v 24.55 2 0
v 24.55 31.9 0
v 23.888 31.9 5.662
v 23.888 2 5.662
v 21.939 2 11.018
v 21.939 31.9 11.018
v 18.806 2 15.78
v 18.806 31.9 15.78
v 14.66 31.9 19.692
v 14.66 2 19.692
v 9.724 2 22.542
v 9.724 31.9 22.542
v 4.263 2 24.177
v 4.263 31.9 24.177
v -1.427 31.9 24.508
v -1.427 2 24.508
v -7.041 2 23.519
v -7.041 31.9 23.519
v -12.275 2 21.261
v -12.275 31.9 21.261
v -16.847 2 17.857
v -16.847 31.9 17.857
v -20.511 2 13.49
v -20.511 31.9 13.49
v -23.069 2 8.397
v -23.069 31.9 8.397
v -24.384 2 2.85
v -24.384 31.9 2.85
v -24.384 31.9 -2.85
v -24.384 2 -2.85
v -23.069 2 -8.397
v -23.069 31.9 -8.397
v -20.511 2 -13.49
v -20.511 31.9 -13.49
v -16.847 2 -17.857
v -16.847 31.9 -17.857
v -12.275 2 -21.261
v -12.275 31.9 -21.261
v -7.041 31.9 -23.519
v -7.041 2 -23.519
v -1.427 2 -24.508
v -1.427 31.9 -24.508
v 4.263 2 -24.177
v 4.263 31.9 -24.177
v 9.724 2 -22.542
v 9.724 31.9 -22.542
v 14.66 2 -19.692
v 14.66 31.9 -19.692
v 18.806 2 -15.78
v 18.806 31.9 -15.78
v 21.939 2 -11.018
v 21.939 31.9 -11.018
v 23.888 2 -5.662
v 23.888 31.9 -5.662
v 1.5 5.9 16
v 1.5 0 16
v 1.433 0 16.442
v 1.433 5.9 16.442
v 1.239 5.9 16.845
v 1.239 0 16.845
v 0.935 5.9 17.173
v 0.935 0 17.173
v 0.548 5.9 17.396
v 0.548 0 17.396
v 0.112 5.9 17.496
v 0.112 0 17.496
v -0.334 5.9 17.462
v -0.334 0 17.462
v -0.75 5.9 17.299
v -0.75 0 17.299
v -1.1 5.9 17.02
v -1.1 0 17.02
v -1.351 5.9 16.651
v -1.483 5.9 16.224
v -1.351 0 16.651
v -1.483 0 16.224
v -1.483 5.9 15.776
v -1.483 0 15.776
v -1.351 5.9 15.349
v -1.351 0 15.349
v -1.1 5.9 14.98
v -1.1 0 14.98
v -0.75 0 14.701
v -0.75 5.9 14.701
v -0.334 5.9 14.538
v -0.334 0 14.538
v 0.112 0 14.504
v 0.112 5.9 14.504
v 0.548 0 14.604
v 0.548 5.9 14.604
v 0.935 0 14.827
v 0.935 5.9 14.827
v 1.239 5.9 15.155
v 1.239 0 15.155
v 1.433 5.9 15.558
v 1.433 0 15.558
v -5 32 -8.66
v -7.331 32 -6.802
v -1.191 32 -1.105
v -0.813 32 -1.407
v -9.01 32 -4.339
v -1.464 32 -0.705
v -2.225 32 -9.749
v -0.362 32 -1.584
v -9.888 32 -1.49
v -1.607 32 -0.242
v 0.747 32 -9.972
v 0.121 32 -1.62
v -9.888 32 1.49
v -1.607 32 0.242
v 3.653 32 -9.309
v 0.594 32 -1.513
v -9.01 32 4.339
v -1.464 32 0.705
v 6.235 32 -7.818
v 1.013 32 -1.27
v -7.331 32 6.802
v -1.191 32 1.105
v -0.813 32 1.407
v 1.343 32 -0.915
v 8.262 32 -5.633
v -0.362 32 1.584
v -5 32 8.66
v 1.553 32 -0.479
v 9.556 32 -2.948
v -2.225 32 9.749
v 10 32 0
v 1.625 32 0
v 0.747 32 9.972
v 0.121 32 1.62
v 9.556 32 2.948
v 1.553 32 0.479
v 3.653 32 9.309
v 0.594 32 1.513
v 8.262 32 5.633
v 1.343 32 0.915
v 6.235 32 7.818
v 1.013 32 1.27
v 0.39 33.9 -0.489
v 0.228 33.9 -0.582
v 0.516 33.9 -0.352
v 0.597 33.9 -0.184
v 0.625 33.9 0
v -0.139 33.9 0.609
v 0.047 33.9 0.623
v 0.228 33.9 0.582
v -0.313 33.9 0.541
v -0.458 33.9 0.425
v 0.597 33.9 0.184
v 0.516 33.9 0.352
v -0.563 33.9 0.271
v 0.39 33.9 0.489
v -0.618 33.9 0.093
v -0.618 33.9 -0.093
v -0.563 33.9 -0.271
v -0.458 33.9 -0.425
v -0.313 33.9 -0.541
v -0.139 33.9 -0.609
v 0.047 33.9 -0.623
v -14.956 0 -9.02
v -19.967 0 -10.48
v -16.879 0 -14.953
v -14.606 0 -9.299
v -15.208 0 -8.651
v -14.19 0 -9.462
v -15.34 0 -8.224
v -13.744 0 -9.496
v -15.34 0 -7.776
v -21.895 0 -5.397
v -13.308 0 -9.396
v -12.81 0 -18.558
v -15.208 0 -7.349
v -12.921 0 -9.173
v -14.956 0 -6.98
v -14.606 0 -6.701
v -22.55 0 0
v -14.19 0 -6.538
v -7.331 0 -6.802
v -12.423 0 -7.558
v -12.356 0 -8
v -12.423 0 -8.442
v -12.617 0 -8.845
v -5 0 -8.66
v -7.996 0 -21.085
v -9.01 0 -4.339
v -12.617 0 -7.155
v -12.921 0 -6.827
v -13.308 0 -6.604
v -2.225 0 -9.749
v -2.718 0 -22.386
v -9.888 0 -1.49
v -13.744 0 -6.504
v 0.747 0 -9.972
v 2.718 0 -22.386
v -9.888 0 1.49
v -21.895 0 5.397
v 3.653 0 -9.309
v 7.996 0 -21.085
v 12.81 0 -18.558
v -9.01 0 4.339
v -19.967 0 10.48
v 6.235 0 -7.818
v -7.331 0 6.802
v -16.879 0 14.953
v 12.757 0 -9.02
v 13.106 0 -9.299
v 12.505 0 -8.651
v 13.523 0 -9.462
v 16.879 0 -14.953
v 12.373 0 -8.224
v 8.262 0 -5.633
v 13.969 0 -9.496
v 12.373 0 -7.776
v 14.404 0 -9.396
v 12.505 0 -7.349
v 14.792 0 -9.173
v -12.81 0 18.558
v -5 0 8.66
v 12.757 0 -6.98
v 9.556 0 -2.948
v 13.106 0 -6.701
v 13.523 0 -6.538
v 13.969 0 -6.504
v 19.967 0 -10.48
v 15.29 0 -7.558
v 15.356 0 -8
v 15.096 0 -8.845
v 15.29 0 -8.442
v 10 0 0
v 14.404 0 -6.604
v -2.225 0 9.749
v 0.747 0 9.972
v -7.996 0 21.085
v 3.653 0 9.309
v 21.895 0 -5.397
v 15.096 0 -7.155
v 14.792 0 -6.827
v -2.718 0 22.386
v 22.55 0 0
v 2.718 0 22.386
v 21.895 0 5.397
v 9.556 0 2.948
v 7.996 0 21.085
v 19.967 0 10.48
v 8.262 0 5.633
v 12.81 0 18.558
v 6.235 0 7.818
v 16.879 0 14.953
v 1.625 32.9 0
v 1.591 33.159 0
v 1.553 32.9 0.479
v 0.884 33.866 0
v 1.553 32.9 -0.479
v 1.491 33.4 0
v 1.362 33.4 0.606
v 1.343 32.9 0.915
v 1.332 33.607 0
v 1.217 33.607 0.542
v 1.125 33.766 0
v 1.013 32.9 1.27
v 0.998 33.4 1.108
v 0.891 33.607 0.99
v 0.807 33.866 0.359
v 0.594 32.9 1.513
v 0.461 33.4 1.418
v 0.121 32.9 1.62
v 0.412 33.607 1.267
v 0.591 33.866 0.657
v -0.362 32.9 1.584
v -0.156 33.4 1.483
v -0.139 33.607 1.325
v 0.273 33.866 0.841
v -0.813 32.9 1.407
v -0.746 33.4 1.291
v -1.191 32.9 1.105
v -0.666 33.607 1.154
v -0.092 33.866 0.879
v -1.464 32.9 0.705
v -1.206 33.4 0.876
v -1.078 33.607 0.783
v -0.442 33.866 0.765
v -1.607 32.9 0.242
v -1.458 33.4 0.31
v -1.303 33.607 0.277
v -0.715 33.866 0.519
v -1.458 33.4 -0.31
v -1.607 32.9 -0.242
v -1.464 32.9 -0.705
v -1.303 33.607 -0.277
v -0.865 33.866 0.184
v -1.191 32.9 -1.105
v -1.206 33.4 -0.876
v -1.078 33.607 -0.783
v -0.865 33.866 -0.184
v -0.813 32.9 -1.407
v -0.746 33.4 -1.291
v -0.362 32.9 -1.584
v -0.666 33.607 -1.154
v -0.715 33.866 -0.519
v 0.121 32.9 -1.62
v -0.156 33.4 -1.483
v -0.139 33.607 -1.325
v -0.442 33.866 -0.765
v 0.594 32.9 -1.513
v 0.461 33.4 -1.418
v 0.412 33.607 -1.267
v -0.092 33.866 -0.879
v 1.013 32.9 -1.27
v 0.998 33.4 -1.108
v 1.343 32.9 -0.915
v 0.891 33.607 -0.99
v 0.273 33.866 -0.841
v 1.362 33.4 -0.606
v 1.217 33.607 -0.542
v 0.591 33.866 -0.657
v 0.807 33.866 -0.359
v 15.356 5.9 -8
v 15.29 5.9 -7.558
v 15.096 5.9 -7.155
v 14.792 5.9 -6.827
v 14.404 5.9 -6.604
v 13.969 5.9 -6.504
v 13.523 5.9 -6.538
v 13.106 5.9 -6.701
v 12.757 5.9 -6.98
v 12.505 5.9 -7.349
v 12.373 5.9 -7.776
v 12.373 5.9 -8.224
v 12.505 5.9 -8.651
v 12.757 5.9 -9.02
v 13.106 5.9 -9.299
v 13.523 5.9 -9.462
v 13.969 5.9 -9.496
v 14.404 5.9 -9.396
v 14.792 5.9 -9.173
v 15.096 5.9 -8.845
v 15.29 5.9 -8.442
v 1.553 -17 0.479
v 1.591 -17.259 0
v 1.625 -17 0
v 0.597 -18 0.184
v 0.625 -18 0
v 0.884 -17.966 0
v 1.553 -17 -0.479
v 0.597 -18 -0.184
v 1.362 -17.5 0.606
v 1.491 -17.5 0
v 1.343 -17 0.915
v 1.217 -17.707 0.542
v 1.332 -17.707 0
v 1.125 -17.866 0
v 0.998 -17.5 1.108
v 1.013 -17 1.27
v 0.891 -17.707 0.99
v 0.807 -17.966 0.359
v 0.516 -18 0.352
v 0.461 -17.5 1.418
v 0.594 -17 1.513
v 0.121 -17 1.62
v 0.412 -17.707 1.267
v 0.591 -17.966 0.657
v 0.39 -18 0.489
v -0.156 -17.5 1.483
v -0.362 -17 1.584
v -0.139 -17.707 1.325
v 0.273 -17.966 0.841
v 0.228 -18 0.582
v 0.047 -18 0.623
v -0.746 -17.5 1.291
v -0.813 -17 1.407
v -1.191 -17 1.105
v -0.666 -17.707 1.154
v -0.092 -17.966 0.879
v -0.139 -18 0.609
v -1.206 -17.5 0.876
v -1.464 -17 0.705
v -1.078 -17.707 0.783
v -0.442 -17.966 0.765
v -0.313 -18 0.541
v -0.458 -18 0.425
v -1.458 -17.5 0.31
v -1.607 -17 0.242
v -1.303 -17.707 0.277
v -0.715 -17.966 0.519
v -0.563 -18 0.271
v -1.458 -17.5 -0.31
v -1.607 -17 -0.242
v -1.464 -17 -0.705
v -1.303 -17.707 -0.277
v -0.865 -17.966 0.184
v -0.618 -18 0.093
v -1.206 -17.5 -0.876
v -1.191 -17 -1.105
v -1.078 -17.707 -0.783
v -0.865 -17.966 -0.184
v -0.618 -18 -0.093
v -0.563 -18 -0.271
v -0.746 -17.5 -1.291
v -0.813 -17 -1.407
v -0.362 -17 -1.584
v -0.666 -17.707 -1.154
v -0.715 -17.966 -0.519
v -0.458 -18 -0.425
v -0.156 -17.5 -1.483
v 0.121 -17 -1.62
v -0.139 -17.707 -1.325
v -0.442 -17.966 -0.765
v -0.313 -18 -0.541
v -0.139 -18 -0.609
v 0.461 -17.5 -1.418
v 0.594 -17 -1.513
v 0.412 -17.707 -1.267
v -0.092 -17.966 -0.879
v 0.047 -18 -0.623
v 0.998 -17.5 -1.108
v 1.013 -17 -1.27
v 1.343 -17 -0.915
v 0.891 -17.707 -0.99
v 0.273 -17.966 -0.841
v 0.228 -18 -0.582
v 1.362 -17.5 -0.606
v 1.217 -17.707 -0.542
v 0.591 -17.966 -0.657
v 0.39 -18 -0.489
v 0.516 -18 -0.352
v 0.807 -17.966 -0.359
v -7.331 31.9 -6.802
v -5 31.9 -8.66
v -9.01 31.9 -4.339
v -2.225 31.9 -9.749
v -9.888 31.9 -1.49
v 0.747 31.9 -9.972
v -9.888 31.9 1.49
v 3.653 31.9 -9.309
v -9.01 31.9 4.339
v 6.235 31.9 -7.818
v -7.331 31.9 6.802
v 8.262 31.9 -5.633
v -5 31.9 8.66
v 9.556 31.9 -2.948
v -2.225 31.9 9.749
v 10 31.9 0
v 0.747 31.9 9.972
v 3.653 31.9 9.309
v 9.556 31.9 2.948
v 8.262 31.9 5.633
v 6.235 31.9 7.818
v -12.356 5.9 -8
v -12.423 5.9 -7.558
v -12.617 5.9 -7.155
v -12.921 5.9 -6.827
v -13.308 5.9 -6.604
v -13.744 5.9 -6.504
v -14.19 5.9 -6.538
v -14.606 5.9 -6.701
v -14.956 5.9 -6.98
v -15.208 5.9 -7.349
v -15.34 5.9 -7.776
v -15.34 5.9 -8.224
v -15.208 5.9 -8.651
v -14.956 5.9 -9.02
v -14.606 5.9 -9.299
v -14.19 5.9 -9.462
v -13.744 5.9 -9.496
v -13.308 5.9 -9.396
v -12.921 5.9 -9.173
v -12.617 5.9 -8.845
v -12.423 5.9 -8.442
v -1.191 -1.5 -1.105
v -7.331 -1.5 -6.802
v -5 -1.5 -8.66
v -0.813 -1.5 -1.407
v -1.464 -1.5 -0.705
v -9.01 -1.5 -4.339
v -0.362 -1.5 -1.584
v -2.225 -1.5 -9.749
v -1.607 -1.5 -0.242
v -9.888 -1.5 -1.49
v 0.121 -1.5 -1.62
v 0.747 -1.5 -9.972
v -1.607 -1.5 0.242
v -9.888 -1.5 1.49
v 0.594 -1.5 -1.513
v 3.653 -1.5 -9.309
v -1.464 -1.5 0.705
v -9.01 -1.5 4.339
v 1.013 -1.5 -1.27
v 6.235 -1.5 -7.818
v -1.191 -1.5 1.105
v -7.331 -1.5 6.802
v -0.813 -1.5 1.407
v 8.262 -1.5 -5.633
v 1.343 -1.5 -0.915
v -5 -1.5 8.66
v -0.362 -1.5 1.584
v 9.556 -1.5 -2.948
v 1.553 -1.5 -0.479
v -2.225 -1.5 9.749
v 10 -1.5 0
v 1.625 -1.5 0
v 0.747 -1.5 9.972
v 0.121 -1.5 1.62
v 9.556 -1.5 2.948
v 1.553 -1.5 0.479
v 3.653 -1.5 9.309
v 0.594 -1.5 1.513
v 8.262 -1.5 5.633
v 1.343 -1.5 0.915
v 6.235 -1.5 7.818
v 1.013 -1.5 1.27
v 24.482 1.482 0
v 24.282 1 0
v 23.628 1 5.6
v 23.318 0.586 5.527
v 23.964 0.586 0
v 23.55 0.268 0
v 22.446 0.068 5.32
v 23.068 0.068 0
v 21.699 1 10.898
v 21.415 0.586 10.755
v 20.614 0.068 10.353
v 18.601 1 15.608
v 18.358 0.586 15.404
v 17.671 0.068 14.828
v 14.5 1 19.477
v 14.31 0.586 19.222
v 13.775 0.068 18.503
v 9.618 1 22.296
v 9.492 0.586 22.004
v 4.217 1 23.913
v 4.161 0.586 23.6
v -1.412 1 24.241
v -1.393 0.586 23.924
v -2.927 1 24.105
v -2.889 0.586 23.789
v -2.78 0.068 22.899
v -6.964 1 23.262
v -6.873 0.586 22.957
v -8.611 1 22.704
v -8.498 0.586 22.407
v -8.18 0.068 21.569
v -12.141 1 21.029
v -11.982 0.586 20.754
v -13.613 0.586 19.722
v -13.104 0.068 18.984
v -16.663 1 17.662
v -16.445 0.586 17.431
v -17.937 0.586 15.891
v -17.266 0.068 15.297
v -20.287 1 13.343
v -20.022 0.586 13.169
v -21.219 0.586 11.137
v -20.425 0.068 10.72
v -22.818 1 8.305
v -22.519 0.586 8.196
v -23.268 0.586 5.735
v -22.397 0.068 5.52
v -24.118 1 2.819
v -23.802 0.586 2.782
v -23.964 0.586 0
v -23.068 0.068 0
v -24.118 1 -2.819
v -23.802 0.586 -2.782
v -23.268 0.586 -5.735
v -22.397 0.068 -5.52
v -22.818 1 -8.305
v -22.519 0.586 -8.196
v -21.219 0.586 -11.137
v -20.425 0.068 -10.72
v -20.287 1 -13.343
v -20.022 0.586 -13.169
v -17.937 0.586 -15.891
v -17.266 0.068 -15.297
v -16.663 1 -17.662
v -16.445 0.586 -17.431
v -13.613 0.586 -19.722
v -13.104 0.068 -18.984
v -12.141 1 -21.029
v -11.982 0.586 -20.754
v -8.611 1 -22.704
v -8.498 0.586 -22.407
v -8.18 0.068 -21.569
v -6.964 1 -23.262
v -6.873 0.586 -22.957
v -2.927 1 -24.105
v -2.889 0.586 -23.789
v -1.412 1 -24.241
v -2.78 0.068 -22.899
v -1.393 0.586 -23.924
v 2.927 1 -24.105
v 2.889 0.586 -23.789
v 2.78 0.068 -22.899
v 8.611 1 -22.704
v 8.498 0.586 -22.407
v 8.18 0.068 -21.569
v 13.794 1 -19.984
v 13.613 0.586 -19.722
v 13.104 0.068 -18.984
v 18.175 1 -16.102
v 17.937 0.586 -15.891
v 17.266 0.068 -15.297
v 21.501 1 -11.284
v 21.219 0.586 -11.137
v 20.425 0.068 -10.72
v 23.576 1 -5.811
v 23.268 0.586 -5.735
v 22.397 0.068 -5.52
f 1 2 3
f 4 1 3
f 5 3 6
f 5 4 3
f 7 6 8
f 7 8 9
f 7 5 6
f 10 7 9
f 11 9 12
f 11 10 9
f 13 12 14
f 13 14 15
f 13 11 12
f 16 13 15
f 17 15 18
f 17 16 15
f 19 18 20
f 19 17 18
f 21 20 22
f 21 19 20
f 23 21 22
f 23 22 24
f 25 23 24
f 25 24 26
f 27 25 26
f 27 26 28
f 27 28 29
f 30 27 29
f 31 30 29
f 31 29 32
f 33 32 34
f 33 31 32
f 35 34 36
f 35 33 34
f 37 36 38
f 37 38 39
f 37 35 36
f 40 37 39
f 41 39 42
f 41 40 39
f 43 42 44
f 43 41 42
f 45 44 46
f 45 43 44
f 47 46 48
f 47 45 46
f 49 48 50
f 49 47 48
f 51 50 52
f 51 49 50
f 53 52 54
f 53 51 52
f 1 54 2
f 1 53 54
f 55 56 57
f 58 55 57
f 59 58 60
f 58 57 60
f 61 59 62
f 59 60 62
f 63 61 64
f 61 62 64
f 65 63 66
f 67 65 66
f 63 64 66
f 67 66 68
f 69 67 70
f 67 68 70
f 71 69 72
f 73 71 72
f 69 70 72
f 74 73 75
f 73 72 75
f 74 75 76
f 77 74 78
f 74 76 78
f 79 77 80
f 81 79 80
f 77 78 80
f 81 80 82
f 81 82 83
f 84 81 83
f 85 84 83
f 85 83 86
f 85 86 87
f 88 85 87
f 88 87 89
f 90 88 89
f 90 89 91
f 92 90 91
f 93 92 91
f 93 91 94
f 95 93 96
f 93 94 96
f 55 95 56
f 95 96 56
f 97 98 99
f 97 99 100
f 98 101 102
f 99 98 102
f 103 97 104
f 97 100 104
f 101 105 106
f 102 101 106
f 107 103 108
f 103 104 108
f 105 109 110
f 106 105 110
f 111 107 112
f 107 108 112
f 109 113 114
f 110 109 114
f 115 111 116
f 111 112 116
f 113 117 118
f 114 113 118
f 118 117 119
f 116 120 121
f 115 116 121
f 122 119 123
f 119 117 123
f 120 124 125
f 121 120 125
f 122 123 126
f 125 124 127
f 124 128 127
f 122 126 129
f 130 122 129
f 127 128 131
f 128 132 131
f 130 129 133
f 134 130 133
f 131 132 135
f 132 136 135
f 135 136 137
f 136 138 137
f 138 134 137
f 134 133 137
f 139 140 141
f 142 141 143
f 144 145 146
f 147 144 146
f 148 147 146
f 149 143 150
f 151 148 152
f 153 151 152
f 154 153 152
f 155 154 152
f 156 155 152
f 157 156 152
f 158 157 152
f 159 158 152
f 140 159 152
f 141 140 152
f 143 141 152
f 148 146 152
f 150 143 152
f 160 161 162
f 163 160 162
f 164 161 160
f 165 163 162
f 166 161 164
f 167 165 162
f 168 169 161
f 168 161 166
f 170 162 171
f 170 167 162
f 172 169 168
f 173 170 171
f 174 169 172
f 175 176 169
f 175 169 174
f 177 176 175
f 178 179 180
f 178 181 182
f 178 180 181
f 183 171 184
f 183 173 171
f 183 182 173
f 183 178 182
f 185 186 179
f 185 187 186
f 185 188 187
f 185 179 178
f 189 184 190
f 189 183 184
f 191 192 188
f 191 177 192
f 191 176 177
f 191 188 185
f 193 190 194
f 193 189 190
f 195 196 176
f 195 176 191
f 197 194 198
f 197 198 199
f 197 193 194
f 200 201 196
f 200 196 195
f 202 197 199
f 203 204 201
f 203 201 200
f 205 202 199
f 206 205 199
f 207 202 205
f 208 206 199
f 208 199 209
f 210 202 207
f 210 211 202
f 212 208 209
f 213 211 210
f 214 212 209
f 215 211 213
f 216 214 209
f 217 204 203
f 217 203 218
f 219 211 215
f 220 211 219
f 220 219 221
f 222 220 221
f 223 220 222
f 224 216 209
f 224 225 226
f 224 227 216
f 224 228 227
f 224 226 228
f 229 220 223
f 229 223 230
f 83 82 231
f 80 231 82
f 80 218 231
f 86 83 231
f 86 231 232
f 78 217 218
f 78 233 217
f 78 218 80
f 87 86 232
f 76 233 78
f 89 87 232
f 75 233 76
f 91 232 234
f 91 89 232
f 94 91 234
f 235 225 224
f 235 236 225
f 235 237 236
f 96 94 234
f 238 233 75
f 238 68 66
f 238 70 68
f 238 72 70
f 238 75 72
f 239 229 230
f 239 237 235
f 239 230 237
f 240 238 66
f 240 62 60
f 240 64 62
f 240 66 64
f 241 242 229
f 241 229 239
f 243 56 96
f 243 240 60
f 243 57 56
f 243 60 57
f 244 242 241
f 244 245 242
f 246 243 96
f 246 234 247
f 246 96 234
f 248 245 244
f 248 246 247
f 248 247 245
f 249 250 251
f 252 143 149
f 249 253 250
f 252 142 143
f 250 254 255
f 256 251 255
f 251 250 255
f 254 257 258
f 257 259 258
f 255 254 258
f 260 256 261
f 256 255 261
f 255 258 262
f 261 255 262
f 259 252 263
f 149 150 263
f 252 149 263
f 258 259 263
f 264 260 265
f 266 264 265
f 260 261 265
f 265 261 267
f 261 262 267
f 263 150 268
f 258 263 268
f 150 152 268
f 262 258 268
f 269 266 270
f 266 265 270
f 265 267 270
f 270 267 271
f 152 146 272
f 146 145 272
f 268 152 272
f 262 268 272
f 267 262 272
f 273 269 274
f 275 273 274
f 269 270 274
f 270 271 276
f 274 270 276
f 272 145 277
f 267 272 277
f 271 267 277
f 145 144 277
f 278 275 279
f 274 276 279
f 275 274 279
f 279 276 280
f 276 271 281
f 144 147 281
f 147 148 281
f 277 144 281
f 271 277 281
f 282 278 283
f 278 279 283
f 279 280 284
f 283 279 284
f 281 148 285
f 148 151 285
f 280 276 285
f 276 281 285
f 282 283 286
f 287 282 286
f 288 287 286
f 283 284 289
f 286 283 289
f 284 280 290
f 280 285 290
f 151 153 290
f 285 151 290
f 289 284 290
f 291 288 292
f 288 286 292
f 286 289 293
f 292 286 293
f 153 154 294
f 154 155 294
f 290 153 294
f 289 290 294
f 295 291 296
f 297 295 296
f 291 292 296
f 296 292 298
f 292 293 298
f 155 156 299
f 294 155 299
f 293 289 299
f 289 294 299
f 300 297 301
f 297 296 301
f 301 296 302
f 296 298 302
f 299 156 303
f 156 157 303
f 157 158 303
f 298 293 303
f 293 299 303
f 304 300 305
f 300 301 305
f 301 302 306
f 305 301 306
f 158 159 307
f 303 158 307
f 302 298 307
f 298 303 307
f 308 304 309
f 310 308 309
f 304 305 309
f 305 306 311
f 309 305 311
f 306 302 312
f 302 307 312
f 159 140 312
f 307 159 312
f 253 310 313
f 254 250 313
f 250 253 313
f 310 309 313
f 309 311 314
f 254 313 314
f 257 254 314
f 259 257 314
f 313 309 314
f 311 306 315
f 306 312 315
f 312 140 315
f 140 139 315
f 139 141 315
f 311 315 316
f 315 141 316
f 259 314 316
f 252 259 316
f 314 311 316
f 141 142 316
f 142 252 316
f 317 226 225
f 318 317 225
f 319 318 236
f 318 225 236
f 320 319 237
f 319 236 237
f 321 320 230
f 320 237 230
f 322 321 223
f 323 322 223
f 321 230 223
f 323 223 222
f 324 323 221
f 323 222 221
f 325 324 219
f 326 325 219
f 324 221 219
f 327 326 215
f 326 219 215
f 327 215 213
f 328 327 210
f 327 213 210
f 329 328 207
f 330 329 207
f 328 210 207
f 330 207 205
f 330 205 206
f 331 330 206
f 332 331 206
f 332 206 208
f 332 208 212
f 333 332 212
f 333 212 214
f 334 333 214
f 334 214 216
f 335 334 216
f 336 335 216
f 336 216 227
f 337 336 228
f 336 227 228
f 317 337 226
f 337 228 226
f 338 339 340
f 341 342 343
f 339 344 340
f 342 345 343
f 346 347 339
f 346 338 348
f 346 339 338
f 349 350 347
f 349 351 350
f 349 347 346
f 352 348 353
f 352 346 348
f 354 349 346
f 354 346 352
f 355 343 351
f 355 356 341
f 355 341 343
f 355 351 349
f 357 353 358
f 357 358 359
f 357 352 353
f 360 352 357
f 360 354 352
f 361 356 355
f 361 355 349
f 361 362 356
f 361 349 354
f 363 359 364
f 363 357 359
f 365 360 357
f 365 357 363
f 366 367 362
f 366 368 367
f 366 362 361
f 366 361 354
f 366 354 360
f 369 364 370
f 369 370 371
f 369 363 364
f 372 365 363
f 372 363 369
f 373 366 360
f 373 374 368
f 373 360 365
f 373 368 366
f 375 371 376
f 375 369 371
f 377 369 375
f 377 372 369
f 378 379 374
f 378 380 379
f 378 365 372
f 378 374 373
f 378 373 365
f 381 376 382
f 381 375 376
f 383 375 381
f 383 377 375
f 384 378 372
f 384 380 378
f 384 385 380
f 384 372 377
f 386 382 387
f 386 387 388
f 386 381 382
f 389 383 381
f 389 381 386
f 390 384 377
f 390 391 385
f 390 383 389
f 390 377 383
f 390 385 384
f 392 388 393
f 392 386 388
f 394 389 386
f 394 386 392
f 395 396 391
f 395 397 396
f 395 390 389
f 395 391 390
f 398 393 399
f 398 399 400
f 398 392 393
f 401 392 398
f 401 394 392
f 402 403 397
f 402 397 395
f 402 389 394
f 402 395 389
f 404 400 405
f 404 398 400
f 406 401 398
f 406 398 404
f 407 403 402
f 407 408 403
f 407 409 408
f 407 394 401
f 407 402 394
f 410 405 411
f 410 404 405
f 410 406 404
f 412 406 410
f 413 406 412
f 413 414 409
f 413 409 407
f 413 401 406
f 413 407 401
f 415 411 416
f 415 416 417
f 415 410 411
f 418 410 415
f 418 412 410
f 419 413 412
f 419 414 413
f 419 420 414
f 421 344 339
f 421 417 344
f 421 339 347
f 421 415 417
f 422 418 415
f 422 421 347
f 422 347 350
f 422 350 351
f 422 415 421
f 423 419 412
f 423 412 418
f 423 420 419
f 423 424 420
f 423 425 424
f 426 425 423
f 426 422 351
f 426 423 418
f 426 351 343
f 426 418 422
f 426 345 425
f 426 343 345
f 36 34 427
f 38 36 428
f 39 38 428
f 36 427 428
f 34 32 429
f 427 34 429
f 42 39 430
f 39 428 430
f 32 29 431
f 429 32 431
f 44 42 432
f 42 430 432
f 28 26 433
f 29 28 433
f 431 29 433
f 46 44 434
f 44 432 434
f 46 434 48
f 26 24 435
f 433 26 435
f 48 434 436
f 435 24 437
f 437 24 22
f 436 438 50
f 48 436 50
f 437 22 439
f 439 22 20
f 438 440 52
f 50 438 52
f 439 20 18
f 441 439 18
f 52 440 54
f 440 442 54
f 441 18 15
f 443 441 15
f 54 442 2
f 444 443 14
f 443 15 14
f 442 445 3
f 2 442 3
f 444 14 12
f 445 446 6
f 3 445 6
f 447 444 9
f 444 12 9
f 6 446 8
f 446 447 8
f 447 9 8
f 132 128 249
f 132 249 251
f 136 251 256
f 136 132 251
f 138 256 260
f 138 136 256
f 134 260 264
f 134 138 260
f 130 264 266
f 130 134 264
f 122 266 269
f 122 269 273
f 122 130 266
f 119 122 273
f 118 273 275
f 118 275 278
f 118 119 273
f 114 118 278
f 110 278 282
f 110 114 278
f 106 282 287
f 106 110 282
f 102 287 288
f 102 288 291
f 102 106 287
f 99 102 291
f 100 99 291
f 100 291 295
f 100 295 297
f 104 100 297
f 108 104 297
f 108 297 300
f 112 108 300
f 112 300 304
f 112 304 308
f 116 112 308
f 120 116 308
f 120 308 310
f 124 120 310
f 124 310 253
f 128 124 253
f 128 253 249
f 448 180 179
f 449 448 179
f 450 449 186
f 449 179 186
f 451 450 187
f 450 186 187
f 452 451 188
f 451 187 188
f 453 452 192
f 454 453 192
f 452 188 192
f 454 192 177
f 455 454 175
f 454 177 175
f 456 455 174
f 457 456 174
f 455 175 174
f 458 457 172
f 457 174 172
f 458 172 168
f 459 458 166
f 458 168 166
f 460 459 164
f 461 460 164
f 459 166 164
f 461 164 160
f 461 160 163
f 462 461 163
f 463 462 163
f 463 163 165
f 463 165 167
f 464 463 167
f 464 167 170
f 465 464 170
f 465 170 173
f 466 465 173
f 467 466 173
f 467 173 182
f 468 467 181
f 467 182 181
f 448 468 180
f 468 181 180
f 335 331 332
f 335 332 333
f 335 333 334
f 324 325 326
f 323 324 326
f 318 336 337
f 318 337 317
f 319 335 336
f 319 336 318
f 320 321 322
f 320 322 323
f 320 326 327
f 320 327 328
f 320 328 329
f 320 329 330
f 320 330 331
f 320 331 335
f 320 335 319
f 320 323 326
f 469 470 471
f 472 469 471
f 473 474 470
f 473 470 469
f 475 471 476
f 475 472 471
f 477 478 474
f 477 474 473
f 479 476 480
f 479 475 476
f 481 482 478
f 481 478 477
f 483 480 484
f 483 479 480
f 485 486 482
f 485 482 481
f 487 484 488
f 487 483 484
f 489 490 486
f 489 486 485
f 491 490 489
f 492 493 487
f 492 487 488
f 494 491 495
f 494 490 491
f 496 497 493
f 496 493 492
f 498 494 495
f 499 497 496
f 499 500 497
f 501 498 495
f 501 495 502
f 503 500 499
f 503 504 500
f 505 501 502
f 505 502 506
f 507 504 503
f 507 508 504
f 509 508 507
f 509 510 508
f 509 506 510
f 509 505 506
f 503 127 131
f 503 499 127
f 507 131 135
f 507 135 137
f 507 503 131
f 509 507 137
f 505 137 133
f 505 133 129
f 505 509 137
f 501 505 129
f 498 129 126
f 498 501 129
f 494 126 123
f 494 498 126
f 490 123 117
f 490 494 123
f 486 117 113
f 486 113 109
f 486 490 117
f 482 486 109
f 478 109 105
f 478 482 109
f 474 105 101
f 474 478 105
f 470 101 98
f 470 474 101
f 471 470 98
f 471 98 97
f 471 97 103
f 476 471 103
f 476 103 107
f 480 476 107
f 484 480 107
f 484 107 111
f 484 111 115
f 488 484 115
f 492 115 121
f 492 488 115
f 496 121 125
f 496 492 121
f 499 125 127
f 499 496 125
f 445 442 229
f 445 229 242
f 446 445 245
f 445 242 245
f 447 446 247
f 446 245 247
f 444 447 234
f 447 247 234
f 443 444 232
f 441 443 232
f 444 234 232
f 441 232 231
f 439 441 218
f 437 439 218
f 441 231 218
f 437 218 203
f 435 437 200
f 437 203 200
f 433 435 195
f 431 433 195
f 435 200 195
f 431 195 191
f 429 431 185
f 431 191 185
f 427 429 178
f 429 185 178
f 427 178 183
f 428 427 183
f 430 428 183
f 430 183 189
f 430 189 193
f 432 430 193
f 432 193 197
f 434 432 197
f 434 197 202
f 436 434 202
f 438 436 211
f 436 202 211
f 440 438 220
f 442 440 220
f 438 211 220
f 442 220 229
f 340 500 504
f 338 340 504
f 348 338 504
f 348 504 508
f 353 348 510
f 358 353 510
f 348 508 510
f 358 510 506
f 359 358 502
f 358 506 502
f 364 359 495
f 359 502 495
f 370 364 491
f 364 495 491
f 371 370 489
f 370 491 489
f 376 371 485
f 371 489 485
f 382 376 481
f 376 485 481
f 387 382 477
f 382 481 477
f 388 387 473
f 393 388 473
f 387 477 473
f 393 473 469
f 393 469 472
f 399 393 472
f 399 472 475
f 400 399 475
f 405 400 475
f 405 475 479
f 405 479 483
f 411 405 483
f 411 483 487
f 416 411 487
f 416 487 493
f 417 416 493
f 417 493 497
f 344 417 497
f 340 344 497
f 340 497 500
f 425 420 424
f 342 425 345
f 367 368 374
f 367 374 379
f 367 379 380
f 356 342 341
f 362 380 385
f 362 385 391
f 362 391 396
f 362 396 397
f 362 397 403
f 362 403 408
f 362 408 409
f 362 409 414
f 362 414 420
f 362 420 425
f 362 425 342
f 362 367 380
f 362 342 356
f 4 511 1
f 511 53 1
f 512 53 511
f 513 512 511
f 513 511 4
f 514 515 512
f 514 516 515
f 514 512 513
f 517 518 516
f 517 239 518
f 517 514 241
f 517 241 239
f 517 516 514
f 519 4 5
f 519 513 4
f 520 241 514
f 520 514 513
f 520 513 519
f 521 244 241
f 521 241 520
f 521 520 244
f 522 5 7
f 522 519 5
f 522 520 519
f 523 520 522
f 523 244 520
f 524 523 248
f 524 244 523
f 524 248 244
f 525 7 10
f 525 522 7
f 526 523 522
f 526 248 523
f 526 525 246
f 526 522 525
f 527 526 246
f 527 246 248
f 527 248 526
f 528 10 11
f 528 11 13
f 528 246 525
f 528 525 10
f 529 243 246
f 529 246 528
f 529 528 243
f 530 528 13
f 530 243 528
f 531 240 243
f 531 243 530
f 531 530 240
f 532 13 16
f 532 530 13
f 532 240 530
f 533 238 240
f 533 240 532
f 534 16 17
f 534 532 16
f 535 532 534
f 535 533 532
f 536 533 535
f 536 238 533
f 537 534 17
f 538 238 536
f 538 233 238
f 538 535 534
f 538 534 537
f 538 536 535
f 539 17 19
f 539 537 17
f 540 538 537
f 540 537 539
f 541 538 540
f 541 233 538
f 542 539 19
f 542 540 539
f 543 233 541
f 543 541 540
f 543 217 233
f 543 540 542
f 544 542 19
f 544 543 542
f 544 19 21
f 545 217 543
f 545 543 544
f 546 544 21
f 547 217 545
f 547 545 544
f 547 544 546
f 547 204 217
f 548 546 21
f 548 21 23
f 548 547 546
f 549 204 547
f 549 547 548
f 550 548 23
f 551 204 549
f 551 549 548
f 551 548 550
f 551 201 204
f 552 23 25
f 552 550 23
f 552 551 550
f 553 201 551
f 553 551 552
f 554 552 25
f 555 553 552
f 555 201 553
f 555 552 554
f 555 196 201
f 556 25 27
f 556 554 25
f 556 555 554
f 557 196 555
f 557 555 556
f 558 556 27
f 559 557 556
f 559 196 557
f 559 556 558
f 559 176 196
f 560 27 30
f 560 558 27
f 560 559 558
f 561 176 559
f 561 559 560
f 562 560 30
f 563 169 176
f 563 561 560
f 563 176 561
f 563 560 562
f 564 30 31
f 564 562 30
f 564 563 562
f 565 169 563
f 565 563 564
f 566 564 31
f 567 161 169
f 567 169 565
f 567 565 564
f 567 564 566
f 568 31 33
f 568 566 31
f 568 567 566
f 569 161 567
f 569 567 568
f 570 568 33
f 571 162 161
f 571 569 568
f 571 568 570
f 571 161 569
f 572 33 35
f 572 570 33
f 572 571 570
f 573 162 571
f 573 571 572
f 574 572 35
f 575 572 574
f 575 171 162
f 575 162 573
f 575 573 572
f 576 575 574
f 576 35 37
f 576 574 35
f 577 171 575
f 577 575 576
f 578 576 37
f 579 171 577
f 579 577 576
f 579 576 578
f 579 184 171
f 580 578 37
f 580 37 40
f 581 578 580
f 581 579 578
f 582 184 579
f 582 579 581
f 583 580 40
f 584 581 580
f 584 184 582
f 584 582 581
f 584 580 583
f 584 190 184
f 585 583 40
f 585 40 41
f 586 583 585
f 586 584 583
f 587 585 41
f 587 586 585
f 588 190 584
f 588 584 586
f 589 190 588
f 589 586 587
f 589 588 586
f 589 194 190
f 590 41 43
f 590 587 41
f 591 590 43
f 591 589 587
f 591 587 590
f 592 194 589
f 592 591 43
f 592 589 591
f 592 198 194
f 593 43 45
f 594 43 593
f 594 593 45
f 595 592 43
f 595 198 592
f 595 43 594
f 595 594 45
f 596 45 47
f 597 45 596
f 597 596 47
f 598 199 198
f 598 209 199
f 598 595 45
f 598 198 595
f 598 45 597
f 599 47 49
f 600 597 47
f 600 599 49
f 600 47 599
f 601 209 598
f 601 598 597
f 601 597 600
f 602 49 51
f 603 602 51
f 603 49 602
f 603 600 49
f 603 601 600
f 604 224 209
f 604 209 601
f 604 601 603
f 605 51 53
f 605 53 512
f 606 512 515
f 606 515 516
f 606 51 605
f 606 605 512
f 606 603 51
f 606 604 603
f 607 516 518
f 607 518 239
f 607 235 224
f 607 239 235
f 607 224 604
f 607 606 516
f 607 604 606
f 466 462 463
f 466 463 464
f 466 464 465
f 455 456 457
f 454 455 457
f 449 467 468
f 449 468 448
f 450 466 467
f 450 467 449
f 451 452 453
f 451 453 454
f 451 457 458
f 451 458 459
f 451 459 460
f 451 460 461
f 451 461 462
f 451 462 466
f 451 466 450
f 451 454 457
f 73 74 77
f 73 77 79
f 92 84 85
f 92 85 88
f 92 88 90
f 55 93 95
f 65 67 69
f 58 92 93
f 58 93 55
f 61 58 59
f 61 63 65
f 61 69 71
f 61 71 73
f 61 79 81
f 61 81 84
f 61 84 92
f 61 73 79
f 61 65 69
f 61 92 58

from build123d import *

# Parameters (mm, degrees)
F0_R          = 24.55
F0_R_2        = 10
F1_DEPTH      = 31.9
F2_R          = 10
F2_R_2        = 1.625
F3_DEPTH      = 1.5
F3_DEPTH_BACK = 32
F4_R          = 1.625
F5_DEPTH      = 18
F5_DEPTH_BACK = 33.9
F6_R          = 2
F7_R          = 1
F8_R          = 1
F9_R          = 1.5
F10_DEPTH     = 5.9


with BuildPart() as f1:
    # F0 (on Front) → F1 (new body)
    with BuildSketch(Plane.XZ):
        Circle(F0_R)
        Circle(F0_R_2, mode=Mode.SUBTRACT)
    extrude(amount=-F1_DEPTH)

    # F6
    f6_edges = [f1.edges().sort_by_distance(p)[0] for p in [
        (-24.55, 0, 0),
    ]]
    fillet(f6_edges, radius=F6_R)

    # F9 (on Front) → F10 (cut)
    with BuildSketch(Plane.XZ):
        with Locations((13.856406, -8)):
            Circle(F9_R)
        with Locations((-13.856406, -8)):
            Circle(F9_R)
        with Locations((0, 16)):
            Circle(F9_R)
    extrude(amount=-F10_DEPTH, mode=Mode.SUBTRACT)


with BuildPart() as f3:
    # F2 (on Front) → F3 (new body, two sides)
    with BuildSketch(Plane.XZ) as f3_sk:
        Circle(F2_R)
        Circle(F2_R_2, mode=Mode.SUBTRACT)
    extrude(amount=F3_DEPTH)
    extrude(f3_sk.sketch, amount=-F3_DEPTH_BACK)

    # F4 (on Front) → F5 (join, two sides)
    with BuildSketch(Plane.XZ) as f5_sk:
        Circle(F4_R)
    extrude(amount=F5_DEPTH)
    extrude(f5_sk.sketch, amount=-F5_DEPTH_BACK)

    # F7
    f7_edges = [f3.edges().sort_by_distance(p)[0] for p in [
        (-1.625, -18, 0),
    ]]
    fillet(f7_edges, radius=F7_R)

    # F8
    f8_edges = [f3.edges().sort_by_distance(p)[0] for p in [
        (-1.625, 33.9, 0),
    ]]
    fillet(f8_edges, radius=F8_R)


solid = Compound([f1.part, f3.part])
